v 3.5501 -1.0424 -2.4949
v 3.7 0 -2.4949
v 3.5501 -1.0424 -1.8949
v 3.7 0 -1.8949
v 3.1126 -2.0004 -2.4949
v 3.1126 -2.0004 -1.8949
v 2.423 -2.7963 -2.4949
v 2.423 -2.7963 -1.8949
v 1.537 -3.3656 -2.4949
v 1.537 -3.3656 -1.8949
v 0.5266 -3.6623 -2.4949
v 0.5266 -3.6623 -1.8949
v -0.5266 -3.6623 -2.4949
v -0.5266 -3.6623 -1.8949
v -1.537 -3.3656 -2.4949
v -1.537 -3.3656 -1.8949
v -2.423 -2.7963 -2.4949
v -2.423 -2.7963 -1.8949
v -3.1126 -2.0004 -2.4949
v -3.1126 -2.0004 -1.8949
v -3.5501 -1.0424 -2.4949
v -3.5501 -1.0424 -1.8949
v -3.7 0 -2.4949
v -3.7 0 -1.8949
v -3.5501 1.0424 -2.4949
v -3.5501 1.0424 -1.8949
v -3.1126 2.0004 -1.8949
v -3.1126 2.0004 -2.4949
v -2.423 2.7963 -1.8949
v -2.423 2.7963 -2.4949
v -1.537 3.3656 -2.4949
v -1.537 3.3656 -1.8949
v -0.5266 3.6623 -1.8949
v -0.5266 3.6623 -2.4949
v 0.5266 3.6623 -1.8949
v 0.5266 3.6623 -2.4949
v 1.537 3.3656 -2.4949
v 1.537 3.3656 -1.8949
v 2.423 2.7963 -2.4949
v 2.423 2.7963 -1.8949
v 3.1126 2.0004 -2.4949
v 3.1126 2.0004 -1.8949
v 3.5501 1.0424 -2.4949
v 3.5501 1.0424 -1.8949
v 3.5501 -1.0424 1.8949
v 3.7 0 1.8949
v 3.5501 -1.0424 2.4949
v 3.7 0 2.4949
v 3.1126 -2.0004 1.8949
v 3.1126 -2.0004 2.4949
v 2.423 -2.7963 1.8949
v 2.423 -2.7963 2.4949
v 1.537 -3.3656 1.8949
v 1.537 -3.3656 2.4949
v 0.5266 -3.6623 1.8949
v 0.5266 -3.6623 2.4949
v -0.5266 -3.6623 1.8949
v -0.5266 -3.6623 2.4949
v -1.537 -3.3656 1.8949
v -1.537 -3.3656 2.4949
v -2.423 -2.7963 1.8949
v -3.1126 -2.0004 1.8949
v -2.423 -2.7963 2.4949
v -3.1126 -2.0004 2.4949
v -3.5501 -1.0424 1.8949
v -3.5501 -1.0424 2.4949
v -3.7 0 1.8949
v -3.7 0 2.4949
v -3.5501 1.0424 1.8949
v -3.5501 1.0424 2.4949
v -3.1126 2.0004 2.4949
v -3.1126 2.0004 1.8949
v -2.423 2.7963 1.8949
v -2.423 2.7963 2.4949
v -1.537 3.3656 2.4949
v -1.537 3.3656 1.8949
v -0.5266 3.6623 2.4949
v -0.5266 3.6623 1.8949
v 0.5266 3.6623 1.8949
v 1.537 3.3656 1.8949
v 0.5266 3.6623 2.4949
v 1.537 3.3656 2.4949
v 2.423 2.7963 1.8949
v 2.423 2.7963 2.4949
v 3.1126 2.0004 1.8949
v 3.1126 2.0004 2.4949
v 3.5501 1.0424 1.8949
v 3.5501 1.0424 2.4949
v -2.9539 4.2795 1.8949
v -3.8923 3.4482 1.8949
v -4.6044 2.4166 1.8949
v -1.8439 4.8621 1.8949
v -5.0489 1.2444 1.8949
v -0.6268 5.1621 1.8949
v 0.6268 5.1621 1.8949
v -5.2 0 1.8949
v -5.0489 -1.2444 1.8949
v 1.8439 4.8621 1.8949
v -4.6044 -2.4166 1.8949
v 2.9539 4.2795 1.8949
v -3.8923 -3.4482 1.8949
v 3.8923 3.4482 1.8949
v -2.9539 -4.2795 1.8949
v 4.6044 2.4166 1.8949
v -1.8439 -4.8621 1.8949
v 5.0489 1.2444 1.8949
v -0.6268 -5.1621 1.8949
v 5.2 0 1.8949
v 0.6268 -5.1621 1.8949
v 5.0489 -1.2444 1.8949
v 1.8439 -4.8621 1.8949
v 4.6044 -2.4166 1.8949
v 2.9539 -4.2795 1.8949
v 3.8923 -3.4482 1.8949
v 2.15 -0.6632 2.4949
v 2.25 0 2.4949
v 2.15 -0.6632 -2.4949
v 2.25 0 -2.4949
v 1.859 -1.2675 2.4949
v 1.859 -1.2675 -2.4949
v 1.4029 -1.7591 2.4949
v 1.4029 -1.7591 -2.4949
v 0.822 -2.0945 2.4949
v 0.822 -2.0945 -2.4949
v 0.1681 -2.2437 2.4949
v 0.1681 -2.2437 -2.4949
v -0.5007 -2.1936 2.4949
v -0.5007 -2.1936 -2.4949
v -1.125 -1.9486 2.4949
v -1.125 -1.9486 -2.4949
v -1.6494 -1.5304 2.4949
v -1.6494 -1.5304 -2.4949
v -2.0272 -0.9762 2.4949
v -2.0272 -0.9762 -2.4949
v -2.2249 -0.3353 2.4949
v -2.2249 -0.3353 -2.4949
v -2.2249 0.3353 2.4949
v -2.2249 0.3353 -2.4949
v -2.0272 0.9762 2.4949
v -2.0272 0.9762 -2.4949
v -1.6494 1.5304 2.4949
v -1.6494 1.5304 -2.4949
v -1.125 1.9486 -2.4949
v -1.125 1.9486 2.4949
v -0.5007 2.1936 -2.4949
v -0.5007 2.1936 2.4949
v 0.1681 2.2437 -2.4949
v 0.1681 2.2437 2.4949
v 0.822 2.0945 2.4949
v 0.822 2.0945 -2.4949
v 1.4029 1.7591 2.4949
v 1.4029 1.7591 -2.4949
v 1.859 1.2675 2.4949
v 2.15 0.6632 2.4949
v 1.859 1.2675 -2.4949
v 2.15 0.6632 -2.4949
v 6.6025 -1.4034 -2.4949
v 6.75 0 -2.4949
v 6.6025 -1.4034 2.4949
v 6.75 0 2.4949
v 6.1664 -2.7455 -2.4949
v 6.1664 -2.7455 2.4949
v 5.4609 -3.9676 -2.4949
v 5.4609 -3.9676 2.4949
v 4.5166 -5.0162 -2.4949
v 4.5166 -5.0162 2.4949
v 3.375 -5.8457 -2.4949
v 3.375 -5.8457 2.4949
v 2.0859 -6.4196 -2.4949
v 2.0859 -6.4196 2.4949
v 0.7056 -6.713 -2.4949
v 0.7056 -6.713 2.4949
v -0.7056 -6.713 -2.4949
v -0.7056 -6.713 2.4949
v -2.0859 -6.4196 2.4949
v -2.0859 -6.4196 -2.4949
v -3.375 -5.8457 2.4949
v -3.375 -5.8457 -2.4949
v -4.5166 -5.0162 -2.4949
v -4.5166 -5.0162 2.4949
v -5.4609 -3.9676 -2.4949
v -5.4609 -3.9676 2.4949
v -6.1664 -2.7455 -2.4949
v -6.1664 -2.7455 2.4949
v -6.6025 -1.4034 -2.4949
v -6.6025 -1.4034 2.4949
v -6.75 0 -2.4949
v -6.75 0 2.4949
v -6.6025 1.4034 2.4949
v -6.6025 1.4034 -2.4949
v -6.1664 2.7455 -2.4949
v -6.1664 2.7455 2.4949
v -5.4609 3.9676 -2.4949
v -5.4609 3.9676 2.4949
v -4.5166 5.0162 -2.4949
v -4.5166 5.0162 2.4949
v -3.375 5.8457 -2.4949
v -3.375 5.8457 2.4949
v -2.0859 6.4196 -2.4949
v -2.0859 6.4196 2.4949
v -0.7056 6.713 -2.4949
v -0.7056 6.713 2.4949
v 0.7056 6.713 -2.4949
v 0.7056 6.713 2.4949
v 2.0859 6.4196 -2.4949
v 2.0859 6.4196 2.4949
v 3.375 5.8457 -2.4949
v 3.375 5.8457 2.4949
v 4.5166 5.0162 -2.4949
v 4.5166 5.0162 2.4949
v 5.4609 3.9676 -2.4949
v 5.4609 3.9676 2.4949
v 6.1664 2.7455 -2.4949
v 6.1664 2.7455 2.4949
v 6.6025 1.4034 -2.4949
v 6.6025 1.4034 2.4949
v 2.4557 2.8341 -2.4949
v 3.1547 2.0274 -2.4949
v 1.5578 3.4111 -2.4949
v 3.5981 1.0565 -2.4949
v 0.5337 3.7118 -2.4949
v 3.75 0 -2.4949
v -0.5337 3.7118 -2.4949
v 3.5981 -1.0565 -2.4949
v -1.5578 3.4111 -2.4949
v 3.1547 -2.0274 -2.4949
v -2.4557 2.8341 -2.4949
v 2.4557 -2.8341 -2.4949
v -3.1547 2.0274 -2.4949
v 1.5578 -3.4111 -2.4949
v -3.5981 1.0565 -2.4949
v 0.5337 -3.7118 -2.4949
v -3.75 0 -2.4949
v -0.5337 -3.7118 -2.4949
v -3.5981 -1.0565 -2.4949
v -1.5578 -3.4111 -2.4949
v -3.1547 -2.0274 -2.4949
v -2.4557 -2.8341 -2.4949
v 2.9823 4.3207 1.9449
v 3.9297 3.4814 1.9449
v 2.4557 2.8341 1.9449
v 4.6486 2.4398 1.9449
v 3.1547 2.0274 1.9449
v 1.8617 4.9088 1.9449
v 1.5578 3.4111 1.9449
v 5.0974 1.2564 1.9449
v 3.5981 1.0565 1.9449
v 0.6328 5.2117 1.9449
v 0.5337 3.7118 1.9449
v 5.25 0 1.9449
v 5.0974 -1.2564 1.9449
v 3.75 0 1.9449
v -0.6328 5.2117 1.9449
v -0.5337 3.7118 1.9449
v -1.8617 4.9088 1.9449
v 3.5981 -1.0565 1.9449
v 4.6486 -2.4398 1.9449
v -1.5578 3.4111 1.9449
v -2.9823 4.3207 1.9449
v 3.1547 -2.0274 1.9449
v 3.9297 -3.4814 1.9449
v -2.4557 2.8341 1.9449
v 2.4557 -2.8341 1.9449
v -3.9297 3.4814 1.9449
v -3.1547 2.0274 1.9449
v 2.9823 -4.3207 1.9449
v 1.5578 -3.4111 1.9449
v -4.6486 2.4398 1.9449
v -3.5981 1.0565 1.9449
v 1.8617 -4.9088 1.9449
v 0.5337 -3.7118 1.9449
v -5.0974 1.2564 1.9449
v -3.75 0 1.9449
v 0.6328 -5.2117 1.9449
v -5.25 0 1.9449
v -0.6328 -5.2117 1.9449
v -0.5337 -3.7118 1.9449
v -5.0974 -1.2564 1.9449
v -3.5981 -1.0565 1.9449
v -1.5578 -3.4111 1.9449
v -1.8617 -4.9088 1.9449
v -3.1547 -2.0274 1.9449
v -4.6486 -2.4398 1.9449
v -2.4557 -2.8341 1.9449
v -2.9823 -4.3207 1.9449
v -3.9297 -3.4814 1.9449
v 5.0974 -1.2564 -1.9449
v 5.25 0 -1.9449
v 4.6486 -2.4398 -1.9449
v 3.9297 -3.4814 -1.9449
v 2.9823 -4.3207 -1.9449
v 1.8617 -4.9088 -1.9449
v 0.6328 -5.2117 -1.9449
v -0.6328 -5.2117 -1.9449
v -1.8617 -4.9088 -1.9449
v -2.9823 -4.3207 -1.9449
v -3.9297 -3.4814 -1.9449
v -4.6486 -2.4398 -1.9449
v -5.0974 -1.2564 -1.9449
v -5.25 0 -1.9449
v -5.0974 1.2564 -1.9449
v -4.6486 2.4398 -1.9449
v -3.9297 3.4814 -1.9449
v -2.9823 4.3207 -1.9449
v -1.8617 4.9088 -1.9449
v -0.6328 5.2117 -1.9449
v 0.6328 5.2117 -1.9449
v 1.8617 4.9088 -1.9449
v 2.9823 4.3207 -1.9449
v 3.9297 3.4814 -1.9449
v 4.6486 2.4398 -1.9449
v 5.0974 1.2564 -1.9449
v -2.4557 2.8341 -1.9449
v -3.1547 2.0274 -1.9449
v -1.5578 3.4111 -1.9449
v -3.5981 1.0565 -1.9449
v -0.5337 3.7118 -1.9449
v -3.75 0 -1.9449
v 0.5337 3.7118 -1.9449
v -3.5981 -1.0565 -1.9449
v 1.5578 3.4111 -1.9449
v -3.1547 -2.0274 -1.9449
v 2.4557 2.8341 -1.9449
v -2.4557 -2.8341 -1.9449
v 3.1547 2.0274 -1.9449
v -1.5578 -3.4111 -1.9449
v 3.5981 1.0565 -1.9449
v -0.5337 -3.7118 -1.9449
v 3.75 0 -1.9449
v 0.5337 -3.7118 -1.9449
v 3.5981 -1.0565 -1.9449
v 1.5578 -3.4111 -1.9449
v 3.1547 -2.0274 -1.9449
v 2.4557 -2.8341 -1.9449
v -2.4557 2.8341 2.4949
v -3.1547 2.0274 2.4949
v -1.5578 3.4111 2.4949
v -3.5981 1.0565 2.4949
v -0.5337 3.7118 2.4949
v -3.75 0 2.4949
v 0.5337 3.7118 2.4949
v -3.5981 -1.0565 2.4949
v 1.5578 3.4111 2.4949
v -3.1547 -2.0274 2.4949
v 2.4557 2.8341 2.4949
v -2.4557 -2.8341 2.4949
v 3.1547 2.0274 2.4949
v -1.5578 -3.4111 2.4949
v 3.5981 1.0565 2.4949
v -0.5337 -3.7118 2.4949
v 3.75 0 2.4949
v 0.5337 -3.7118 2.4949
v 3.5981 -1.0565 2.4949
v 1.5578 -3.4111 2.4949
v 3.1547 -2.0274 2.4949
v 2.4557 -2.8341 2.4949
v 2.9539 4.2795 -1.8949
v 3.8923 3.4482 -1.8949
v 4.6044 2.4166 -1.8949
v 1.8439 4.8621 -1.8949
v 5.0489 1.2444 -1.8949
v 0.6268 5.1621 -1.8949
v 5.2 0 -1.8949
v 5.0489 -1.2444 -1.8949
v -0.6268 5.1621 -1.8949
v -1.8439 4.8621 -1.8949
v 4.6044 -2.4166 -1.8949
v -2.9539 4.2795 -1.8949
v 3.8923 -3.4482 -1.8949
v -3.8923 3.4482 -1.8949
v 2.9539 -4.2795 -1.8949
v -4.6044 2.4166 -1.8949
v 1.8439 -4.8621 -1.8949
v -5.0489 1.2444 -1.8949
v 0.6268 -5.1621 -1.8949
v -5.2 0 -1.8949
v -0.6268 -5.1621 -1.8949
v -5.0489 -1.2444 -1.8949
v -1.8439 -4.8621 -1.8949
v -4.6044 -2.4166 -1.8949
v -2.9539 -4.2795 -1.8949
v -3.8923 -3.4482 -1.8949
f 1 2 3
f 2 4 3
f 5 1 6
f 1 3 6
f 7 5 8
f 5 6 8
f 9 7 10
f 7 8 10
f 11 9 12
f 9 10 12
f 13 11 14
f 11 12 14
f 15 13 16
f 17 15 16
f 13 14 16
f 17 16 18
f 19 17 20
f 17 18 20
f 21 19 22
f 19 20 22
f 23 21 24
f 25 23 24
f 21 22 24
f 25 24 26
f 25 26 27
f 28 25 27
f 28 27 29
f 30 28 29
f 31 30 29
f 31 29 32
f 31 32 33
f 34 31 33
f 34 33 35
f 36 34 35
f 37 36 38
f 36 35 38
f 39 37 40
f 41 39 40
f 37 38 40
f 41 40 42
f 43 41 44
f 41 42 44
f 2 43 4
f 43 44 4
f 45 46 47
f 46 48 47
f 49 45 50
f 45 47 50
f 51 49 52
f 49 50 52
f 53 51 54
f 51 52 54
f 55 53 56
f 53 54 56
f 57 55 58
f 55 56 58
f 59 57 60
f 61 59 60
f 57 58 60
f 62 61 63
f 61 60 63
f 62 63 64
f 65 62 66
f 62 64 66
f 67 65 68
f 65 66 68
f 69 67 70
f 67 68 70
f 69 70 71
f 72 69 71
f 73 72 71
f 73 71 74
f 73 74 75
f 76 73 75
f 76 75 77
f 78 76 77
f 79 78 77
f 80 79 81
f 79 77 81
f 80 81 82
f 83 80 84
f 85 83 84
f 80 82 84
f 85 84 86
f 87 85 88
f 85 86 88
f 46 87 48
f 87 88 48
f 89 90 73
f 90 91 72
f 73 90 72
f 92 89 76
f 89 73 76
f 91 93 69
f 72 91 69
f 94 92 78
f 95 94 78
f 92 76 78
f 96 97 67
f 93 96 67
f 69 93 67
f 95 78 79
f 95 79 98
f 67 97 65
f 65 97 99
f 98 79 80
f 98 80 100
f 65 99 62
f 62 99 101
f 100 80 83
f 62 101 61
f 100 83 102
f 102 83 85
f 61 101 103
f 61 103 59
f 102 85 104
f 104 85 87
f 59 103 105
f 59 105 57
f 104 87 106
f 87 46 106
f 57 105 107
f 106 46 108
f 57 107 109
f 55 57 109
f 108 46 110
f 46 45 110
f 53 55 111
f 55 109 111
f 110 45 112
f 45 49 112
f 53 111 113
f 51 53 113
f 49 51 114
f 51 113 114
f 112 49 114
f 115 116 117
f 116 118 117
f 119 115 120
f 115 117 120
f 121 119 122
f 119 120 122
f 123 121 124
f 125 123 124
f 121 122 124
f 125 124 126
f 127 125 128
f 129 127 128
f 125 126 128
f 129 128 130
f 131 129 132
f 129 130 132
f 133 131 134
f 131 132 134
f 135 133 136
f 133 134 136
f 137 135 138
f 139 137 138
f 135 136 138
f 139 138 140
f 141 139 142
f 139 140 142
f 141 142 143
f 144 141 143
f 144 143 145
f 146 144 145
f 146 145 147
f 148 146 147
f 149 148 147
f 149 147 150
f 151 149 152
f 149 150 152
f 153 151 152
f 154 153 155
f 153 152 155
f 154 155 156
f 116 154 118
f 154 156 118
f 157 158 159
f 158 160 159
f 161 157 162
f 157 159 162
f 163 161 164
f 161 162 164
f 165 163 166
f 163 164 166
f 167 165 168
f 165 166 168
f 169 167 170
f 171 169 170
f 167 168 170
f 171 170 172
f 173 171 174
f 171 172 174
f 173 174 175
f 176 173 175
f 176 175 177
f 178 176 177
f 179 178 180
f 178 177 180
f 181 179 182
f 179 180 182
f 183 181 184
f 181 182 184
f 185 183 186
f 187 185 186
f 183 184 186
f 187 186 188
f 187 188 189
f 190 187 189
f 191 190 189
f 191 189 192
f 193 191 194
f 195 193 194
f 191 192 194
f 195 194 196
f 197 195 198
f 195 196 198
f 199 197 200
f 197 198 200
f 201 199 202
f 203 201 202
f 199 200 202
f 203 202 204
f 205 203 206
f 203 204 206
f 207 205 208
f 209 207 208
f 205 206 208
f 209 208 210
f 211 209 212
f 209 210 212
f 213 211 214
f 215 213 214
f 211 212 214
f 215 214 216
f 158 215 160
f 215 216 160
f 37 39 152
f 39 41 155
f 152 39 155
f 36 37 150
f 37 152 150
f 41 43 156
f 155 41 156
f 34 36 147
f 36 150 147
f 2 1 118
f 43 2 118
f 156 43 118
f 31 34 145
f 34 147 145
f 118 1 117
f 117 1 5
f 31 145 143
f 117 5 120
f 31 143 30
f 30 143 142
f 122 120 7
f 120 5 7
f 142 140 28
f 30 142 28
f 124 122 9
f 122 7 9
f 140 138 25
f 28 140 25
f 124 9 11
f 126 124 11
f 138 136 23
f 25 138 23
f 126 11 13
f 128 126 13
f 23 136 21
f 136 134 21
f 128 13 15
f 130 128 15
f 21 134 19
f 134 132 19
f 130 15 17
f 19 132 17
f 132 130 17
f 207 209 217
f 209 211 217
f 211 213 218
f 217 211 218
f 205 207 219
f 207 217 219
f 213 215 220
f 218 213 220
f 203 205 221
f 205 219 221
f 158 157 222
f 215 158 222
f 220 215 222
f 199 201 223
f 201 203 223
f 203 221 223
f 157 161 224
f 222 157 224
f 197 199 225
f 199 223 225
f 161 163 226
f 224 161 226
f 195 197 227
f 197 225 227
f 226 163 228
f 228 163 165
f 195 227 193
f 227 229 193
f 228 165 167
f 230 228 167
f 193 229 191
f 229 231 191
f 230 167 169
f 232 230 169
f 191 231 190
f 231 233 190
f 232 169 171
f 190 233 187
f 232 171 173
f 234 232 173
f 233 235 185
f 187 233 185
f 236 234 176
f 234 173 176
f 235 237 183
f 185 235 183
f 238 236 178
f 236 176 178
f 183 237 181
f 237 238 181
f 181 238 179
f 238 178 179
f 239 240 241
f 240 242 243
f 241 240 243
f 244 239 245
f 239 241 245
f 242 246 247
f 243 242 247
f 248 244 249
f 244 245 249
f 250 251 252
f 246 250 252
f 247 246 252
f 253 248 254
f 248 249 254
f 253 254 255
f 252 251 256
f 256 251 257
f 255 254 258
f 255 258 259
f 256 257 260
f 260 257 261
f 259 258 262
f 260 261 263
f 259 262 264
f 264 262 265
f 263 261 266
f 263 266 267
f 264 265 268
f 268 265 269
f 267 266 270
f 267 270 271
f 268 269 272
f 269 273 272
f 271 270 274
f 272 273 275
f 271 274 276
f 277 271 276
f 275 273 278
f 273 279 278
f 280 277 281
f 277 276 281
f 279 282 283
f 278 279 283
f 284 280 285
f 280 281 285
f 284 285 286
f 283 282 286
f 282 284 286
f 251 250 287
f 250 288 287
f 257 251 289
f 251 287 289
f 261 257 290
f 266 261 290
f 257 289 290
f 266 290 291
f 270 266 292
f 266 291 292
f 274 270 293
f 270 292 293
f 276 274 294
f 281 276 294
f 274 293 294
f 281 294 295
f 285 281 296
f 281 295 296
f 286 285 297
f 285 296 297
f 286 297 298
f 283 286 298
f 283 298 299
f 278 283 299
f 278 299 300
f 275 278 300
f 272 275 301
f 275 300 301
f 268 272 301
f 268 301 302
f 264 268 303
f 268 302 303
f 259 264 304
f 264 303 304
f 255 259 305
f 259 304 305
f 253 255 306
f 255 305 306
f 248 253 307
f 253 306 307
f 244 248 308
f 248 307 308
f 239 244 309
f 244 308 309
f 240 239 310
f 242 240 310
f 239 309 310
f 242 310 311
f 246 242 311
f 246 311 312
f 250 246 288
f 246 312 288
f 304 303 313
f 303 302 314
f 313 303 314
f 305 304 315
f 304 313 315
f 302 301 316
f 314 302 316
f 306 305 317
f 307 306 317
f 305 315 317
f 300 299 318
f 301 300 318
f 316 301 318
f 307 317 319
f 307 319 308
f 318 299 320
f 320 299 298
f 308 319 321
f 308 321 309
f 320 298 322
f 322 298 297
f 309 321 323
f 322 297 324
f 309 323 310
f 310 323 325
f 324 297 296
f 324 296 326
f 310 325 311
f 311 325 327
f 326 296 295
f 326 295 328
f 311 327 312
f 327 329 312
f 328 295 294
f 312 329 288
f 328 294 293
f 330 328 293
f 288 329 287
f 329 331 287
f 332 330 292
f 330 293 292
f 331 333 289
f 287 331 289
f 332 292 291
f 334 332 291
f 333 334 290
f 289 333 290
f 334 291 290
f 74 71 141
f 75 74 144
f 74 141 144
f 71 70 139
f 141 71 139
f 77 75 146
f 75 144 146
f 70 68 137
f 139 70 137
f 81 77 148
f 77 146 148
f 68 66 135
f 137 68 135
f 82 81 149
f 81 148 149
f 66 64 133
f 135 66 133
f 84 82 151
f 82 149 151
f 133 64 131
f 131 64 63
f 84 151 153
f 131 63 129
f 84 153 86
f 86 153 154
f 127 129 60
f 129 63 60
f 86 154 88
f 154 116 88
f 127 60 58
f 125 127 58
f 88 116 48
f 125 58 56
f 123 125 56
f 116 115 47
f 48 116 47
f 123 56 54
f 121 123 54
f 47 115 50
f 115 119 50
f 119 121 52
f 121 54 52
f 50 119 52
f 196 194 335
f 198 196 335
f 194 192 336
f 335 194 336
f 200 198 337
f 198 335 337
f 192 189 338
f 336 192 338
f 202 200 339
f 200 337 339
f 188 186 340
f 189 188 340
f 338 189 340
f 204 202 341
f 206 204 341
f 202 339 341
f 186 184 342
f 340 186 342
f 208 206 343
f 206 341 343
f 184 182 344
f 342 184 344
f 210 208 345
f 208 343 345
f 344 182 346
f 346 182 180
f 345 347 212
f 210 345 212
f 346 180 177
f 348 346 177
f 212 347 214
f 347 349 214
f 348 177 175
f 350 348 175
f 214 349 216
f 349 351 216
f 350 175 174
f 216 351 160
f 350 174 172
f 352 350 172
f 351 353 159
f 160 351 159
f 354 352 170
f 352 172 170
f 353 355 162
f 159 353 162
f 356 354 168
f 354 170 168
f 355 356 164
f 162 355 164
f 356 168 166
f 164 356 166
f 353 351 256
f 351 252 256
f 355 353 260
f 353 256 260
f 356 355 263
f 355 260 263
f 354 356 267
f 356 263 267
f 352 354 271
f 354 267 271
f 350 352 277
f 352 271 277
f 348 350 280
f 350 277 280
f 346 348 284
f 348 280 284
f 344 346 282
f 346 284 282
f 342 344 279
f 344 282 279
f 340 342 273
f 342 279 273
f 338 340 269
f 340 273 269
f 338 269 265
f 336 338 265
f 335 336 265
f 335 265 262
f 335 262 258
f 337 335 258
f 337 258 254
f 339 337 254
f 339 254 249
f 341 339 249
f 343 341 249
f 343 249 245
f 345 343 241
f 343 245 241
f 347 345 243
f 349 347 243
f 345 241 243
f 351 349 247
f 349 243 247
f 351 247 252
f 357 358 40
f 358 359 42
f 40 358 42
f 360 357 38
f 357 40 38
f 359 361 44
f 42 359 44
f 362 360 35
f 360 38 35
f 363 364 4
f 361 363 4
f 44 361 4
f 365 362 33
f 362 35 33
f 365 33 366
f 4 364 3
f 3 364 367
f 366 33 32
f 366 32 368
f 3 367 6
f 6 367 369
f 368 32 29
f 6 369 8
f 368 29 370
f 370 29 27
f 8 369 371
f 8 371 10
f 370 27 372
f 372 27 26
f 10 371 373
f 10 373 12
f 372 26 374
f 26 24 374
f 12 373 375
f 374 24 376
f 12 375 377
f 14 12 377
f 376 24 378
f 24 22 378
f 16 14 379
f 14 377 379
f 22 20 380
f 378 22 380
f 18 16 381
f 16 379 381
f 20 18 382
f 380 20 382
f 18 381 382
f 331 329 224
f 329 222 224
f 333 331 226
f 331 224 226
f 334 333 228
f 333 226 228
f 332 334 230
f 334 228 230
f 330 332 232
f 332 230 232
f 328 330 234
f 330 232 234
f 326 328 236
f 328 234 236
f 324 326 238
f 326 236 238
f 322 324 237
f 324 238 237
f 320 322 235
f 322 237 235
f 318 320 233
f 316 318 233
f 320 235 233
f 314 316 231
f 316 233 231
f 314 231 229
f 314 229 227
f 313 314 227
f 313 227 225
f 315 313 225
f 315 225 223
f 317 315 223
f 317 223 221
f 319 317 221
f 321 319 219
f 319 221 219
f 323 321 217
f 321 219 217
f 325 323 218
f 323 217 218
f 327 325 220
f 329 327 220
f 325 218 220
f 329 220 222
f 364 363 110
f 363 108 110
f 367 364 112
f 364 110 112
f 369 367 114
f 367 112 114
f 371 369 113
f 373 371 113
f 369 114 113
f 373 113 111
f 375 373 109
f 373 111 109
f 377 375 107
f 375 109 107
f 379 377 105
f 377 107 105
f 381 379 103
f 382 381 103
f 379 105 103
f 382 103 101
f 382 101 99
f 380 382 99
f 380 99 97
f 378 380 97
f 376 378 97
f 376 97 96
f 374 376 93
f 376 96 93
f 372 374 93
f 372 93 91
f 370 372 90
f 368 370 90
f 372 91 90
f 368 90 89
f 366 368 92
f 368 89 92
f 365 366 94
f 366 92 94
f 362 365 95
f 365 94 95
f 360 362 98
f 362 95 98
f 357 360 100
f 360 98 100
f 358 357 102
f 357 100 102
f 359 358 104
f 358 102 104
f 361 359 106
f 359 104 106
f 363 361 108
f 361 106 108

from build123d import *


with BuildPart() as f1:
    # F0 (on Front) → F1 (revolve)
    with BuildSketch(Plane.XZ):
        Polygon((2.25, -1.944888), (2.25, -2.494888), (3.7, -2.494888), (3.7, -1.894888), (3.75, -1.894888), (5.2, -1.894888), (5.2, 1.894888), (3.75, 1.894888), (3.7, 1.894888), (3.7, 2.494888), (2.25, 2.494888), (2.25, 1.944888), (2.25, 1.894888), (2.25, -1.894888), align=None)
        Polygon((3.75, -2.494888), (6.75, -2.494888), (6.75, 2.494888), (3.75, 2.494888), (3.75, 1.944888), (5.25, 1.944888), (5.25, -1.944888), (3.75, -1.944888), align=None)
    revolve(axis=Axis((0, 0, 0), (0, 0, -1)))


solid = f1.part
